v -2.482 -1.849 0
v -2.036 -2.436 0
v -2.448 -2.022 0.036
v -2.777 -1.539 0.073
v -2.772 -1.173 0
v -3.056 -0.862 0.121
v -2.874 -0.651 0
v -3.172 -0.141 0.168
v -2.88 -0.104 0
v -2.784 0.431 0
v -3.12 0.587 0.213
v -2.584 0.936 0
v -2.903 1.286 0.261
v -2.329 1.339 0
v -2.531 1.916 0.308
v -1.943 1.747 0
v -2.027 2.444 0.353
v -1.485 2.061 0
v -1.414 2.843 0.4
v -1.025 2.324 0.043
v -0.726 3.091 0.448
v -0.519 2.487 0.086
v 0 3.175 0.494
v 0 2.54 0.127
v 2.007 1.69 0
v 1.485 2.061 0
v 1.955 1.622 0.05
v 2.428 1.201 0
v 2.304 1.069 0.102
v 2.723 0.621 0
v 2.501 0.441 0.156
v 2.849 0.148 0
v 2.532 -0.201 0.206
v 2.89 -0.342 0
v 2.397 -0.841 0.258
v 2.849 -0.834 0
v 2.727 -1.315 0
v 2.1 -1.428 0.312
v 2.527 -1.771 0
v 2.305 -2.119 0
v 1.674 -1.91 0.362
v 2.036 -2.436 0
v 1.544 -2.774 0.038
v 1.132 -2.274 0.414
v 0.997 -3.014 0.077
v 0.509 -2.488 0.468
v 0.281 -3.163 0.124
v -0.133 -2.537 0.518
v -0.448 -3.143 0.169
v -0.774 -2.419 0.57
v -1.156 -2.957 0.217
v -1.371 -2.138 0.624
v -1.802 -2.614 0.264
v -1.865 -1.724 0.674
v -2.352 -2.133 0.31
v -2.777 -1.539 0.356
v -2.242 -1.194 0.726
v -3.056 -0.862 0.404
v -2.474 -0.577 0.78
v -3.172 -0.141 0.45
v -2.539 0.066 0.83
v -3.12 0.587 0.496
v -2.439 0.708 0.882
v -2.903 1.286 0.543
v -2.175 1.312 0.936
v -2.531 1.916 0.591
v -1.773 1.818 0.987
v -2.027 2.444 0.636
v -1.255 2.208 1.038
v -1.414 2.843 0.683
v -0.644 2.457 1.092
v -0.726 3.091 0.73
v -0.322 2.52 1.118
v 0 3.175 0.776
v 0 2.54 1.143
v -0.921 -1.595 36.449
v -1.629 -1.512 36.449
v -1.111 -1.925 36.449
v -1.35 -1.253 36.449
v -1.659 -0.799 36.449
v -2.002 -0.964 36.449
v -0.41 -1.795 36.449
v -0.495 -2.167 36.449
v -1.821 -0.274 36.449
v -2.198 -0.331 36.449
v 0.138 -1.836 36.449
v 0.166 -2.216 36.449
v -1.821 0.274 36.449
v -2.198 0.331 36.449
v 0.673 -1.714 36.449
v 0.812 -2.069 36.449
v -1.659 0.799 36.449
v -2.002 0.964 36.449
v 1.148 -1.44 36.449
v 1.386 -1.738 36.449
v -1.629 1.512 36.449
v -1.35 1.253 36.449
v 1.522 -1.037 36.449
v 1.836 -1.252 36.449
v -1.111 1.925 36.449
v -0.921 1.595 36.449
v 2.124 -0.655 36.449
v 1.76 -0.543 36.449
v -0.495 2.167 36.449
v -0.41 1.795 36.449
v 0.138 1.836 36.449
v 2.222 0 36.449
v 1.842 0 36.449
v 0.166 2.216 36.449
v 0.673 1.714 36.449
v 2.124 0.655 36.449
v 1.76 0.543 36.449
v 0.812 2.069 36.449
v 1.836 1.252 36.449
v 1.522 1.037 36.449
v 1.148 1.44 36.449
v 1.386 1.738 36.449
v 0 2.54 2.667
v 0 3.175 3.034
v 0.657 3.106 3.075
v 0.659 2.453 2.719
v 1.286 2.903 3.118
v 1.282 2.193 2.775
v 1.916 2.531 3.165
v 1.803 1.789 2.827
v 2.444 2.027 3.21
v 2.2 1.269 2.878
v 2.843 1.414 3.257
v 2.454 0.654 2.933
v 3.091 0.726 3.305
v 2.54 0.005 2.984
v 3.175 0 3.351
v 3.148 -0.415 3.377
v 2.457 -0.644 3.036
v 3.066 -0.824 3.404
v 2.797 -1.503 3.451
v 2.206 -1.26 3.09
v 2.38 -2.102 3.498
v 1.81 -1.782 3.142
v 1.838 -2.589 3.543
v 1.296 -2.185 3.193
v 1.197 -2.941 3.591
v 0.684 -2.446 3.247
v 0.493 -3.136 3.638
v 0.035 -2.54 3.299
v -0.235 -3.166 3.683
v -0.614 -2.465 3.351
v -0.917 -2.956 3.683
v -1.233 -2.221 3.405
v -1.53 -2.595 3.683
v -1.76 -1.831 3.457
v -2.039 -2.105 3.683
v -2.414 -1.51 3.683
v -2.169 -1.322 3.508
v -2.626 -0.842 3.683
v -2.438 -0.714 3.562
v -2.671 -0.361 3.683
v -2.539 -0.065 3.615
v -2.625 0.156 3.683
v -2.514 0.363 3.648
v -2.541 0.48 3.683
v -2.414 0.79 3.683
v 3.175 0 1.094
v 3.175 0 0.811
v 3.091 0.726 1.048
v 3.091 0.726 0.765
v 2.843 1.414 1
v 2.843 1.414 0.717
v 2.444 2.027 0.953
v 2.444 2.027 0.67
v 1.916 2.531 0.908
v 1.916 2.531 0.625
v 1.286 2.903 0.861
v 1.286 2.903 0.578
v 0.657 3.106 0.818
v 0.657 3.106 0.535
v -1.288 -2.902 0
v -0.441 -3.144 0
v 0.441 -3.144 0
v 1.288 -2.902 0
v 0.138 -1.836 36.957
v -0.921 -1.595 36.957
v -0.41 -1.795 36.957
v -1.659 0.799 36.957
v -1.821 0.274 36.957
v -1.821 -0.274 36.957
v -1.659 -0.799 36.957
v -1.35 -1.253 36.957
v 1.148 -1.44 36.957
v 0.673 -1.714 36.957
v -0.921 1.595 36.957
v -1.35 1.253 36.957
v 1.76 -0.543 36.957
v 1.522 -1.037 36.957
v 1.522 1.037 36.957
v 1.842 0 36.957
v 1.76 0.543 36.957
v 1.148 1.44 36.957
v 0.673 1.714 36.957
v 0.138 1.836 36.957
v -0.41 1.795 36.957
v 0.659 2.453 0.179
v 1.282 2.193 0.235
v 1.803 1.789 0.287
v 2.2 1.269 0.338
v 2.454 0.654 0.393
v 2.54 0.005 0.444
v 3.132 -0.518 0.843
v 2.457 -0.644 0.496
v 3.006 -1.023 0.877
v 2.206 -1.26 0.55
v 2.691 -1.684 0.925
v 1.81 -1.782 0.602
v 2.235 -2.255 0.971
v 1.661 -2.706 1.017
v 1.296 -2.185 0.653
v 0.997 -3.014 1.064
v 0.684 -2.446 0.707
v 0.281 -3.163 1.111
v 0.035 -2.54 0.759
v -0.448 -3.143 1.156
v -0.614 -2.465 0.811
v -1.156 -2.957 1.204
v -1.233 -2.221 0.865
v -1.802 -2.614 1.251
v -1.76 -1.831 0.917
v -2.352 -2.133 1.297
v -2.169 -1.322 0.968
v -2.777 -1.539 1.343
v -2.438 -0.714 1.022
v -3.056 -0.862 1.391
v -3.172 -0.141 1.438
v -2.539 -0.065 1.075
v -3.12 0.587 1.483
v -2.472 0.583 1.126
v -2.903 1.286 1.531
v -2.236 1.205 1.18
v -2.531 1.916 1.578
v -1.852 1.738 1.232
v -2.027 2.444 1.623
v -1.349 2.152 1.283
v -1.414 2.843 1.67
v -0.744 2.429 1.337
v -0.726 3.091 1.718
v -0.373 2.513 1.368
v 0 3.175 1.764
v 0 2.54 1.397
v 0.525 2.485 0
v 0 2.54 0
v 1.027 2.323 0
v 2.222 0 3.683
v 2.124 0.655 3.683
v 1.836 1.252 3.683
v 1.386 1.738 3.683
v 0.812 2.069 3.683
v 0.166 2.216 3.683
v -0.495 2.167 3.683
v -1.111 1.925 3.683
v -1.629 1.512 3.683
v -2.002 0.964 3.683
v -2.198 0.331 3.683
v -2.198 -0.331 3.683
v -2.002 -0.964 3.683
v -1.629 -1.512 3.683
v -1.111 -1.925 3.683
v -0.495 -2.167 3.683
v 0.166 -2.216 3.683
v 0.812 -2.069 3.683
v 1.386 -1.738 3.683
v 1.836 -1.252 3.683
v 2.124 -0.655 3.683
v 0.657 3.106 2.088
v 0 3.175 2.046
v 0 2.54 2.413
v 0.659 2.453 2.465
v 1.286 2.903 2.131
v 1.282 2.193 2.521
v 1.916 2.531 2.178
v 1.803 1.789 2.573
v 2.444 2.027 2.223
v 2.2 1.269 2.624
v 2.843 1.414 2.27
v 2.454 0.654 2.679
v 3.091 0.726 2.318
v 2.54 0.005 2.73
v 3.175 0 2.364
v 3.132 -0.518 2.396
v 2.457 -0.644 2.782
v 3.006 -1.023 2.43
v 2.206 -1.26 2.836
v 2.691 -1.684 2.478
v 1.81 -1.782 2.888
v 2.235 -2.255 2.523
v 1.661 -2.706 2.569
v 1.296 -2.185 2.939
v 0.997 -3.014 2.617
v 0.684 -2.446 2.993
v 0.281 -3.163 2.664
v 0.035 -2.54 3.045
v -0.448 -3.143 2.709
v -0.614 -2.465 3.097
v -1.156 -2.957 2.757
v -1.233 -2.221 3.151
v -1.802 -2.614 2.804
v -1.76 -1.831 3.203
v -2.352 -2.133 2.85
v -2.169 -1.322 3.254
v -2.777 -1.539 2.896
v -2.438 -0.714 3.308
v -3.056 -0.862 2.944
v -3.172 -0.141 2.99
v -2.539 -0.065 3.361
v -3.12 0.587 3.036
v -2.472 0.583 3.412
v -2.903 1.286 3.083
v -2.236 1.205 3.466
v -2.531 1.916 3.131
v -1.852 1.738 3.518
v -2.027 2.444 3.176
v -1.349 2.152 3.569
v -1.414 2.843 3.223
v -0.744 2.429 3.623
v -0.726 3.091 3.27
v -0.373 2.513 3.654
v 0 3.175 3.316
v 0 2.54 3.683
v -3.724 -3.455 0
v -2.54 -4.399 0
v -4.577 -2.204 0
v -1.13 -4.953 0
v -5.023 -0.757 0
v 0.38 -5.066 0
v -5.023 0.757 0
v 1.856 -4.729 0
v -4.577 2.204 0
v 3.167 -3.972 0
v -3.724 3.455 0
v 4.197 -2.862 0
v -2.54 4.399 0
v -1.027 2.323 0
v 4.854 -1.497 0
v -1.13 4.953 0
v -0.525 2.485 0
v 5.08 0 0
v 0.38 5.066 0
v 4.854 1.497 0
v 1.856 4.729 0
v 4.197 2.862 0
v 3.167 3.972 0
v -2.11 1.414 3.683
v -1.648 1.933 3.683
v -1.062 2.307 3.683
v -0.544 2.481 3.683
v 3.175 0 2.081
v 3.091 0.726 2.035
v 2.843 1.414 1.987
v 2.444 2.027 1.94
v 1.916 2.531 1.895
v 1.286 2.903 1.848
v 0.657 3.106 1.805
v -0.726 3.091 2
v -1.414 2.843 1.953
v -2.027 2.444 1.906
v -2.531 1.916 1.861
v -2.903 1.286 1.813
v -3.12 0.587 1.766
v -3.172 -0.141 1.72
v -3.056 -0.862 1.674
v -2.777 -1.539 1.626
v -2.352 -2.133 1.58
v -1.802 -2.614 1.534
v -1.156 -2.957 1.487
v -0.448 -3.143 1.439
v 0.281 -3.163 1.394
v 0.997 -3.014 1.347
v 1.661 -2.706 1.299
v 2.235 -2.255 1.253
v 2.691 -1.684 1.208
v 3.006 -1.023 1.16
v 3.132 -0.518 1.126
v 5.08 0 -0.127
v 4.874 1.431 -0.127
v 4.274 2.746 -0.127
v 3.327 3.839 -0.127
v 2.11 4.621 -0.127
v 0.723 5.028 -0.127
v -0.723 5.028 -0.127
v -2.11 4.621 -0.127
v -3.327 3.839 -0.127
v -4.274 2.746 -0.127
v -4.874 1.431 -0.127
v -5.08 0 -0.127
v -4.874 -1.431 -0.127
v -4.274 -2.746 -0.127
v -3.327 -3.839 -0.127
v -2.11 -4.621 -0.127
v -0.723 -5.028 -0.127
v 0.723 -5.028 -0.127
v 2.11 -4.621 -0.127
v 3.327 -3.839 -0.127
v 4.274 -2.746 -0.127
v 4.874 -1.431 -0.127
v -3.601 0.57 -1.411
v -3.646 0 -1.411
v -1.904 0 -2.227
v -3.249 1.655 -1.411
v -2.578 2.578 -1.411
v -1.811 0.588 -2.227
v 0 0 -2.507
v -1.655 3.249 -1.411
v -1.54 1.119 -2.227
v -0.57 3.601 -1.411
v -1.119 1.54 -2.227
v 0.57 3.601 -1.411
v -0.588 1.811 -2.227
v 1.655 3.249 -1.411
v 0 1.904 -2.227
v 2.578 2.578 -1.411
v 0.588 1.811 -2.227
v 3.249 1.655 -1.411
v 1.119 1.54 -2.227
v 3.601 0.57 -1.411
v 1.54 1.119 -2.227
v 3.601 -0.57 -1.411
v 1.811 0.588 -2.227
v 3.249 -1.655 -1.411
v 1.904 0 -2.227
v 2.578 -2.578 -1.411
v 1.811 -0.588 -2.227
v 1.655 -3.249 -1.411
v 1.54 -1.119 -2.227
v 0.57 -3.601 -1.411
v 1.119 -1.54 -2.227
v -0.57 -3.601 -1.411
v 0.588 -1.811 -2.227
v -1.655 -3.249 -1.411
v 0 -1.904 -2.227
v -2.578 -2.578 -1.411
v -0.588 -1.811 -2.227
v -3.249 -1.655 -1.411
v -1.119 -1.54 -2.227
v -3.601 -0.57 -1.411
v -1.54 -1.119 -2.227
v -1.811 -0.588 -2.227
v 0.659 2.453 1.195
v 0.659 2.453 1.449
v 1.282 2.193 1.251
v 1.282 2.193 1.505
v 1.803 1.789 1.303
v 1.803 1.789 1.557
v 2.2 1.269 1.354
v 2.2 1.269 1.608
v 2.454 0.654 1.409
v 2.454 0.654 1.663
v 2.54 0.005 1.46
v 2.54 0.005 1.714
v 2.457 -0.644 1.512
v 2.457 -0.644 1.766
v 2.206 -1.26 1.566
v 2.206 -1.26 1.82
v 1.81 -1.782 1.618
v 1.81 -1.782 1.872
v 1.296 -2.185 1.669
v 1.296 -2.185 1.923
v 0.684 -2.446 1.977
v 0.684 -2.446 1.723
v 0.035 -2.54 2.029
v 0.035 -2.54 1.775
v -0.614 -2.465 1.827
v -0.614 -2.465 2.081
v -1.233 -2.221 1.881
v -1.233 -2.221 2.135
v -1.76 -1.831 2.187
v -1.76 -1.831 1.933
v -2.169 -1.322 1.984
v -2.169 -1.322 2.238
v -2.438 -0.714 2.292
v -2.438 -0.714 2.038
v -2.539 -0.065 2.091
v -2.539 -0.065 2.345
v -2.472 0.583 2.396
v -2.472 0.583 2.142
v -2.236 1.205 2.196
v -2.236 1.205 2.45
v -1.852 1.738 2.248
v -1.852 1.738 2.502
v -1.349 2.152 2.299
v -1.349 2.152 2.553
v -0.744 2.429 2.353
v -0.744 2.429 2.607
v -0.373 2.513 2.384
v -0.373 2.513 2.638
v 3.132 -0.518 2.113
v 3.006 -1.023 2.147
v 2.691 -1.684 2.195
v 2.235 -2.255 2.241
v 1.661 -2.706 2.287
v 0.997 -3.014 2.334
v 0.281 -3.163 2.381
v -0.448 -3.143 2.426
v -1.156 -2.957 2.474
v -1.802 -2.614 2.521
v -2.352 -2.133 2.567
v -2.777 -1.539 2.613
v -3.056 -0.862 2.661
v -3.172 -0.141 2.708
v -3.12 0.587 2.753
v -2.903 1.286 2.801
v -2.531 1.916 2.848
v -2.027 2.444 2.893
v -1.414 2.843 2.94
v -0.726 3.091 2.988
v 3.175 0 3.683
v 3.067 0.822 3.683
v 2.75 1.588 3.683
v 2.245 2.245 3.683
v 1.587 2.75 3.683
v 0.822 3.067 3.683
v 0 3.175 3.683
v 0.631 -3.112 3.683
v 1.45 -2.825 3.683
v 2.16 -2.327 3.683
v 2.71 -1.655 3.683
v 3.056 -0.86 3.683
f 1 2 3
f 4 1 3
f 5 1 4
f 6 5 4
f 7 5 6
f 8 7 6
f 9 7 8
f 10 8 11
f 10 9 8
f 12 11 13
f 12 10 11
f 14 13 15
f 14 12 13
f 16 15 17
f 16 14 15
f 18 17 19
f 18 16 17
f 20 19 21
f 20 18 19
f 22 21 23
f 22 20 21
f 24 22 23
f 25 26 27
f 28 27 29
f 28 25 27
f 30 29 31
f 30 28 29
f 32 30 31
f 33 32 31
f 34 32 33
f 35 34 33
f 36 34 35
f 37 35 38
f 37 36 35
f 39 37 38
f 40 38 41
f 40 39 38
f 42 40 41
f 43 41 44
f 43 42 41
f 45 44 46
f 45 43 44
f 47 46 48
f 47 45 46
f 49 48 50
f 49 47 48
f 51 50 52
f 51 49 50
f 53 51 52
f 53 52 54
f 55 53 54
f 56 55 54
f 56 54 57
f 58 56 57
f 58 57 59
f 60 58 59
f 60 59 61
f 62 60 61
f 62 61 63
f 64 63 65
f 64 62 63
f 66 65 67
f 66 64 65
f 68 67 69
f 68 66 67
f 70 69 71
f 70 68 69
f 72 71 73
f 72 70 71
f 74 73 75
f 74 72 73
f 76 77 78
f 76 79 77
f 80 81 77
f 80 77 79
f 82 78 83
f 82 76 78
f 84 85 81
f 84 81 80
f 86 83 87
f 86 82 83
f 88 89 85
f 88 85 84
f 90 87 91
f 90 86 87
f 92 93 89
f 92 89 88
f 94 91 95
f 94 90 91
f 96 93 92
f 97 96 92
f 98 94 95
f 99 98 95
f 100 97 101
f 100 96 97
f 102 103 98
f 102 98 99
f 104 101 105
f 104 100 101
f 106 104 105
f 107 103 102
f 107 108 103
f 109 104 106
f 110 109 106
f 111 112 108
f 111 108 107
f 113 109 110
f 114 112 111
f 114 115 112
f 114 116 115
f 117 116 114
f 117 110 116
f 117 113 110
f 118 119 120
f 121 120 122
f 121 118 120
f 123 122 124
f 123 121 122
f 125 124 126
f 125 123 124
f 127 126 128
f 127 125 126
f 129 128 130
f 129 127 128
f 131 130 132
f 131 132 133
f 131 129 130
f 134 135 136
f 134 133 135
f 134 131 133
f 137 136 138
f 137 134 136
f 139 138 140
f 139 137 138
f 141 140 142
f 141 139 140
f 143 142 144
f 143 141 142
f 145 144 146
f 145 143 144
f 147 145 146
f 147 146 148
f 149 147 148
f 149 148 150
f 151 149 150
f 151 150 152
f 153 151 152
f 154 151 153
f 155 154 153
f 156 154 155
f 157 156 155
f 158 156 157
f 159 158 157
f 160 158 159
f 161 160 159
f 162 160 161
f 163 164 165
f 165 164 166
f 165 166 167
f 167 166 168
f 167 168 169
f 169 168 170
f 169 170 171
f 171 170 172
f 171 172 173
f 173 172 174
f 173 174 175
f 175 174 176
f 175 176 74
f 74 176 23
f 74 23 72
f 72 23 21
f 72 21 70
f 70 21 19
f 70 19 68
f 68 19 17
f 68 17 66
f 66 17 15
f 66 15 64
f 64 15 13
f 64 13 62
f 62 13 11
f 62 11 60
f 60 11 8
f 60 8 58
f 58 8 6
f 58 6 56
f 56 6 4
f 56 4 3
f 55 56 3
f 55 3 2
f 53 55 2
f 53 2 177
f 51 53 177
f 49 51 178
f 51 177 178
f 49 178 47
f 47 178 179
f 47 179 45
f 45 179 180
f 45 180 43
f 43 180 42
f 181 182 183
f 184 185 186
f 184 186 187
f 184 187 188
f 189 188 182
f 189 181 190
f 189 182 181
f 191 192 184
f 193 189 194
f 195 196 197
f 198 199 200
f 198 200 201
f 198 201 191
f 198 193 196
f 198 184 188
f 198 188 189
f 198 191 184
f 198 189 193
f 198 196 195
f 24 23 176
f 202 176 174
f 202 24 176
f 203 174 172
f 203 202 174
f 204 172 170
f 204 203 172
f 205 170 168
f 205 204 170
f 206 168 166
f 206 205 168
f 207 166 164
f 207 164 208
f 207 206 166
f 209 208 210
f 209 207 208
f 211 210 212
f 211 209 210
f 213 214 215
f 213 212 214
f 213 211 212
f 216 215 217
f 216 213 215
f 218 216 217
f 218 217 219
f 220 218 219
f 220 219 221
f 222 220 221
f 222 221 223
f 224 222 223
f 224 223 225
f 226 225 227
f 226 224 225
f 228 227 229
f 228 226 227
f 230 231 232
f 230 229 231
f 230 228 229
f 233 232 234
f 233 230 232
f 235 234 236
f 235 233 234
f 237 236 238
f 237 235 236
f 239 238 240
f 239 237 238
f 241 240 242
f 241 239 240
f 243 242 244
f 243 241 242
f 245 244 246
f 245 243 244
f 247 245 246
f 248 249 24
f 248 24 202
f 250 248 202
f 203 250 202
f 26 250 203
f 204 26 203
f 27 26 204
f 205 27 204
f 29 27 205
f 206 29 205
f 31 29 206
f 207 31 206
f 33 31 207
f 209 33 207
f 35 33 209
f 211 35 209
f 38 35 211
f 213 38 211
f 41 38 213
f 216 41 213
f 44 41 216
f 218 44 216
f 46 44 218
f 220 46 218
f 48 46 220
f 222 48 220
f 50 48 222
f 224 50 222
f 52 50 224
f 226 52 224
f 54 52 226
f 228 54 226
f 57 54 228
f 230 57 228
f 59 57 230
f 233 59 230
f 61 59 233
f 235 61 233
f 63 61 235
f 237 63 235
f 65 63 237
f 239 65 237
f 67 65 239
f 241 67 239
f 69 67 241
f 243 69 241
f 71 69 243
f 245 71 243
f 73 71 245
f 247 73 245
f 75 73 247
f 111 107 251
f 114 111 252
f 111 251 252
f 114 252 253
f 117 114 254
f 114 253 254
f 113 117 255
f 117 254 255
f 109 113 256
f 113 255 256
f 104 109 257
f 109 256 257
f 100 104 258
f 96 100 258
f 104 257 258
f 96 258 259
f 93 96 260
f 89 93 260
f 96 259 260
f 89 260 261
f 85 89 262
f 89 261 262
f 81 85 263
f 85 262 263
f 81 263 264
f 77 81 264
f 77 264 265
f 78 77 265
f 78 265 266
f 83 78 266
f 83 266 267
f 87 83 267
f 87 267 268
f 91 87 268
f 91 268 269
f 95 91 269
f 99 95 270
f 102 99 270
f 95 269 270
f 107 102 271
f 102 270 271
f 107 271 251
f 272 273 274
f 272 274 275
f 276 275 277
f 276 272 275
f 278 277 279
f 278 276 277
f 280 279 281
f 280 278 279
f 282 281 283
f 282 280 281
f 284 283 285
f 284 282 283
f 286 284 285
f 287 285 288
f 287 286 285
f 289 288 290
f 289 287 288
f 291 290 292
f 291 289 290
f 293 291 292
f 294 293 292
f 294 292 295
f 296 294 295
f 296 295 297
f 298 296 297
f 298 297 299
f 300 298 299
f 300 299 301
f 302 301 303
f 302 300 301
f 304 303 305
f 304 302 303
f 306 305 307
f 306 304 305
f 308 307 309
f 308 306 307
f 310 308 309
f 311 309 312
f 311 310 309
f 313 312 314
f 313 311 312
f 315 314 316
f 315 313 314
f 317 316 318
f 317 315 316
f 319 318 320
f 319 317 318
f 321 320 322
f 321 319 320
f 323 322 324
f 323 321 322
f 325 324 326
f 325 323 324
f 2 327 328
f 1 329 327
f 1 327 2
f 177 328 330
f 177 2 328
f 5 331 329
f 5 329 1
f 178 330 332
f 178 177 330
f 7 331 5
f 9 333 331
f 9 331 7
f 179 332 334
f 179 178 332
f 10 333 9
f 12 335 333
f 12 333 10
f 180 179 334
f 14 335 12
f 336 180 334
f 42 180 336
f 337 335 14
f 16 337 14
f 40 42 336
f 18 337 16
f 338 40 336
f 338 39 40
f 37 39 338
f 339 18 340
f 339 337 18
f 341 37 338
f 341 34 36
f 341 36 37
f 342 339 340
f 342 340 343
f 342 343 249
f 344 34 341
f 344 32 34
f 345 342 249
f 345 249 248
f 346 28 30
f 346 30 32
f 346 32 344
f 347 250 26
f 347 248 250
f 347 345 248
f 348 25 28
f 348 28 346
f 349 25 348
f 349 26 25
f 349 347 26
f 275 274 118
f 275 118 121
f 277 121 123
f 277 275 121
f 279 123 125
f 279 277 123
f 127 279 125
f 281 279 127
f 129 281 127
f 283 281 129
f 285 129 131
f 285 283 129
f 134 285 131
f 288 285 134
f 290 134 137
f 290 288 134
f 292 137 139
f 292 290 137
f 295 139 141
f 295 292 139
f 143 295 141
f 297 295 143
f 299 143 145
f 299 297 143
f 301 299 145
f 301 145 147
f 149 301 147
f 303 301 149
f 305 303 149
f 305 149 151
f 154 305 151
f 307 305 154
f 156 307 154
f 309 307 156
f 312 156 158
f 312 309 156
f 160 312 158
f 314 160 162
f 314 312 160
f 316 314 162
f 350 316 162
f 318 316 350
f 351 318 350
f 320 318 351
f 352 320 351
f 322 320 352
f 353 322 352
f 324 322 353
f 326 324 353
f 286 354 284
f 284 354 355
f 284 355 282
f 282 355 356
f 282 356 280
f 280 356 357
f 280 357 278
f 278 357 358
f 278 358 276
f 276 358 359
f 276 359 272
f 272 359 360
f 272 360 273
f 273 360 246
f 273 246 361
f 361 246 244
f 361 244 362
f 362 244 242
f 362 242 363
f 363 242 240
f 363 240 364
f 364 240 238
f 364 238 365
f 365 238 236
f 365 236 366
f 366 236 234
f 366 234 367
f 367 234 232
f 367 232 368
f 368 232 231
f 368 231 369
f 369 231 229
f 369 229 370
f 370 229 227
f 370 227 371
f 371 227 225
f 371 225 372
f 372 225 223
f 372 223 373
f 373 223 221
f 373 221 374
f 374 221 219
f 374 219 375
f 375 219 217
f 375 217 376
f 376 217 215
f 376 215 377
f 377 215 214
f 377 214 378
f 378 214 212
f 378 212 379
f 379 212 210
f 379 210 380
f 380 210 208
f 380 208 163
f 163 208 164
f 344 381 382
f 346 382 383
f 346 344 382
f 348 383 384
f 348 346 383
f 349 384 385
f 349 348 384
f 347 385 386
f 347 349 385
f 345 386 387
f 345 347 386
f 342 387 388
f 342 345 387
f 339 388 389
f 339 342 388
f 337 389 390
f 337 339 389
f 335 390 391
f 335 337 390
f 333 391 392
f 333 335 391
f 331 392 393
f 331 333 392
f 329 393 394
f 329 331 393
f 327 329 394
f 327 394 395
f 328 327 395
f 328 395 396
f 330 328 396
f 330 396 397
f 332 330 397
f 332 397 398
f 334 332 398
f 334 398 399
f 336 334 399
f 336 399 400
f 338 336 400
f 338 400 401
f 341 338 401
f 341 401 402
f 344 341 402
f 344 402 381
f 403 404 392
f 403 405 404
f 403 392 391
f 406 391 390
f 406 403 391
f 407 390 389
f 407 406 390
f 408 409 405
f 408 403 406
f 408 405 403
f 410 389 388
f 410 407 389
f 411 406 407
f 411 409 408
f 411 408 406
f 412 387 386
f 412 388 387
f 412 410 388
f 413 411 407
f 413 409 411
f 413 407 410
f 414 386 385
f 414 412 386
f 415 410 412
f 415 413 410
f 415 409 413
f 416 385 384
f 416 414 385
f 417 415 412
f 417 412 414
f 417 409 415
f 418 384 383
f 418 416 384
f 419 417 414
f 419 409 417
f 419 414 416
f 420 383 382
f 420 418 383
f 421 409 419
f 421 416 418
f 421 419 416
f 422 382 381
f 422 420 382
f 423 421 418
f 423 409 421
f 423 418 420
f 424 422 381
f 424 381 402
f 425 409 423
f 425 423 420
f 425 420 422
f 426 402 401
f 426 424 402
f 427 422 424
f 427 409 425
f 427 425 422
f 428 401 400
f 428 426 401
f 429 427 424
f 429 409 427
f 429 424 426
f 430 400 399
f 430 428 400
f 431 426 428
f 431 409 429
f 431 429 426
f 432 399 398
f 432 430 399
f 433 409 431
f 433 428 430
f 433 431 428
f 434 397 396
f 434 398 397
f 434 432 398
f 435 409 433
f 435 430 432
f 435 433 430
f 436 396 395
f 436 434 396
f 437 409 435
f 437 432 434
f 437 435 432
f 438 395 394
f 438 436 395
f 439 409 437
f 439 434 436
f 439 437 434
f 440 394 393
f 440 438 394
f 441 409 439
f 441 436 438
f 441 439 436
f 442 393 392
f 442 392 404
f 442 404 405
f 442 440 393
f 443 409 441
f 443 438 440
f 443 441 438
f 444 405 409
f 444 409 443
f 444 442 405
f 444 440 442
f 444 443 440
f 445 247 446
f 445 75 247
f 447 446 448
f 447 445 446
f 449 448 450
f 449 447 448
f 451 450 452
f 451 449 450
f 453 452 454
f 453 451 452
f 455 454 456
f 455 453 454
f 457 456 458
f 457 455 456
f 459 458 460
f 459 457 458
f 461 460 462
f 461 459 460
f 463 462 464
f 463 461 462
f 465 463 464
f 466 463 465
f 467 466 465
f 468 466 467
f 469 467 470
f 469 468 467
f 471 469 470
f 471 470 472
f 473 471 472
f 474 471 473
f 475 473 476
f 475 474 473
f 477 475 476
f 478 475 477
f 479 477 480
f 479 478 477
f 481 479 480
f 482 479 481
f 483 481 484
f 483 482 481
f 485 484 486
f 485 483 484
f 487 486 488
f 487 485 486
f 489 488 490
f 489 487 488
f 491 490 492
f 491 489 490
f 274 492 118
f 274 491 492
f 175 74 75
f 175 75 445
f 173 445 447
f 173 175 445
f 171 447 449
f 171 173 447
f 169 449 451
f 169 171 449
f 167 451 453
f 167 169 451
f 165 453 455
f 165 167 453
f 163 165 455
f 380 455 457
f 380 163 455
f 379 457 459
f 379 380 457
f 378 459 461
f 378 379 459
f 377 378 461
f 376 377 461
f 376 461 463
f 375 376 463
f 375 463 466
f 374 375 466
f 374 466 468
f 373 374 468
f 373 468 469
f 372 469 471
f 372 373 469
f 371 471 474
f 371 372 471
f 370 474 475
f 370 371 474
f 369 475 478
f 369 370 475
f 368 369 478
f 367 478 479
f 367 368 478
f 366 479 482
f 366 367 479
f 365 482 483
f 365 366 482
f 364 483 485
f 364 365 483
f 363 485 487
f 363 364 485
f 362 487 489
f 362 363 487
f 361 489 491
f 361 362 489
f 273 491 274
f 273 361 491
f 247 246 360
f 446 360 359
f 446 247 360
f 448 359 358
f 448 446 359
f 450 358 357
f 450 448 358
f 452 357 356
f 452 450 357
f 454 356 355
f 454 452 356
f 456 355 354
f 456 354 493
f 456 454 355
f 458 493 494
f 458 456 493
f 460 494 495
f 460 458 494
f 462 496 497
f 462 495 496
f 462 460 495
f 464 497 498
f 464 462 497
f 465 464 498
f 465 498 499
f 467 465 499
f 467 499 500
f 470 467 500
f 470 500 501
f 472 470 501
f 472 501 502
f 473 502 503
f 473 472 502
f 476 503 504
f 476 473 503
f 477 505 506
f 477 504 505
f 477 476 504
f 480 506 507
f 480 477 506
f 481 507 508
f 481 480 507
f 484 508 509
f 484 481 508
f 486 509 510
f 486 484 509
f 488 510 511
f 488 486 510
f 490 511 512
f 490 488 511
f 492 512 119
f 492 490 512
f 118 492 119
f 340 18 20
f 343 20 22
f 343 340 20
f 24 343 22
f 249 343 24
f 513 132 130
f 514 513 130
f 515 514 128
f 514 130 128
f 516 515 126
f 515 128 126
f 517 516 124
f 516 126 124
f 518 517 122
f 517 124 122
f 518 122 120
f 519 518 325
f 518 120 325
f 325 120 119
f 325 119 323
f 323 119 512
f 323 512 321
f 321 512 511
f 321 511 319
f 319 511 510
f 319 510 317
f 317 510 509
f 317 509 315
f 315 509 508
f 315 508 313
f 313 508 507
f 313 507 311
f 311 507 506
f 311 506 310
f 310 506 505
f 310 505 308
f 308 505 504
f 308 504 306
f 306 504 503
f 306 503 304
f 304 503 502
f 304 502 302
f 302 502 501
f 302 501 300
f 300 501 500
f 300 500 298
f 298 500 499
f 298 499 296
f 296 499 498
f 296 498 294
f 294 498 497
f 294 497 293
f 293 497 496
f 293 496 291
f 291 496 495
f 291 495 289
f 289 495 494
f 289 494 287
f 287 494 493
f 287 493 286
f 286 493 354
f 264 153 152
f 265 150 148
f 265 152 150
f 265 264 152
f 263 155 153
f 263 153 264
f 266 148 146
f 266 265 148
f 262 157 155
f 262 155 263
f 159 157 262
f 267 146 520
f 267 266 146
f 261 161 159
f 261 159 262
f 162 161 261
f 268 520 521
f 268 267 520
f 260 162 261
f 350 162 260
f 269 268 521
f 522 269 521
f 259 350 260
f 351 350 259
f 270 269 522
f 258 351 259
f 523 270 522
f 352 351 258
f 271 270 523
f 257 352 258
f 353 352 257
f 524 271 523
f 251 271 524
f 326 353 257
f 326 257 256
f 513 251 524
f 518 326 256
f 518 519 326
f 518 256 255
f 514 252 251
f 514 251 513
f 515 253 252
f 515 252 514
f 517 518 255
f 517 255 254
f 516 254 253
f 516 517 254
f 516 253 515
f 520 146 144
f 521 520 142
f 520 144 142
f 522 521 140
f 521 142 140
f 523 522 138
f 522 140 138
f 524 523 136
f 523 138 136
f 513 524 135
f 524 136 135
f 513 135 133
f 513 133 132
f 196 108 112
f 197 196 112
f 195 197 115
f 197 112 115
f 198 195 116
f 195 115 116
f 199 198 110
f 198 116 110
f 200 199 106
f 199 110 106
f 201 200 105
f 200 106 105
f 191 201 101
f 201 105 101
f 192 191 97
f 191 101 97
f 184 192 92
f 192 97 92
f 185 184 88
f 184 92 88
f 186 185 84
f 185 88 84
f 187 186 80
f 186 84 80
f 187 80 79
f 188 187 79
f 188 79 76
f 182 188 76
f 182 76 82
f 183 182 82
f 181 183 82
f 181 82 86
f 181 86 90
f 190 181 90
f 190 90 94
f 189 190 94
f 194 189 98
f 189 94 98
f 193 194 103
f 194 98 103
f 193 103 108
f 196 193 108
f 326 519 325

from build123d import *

# Parameters (mm, degrees)
SKETCH3_R           = 3.175
BOSS_EXTRUDE1_DEPTH = 3.683
CUT_SWEEP1_PITCH    = 1.27
SKETCH10_R          = 2.2225
BOSS_EXTRUDE5_DEPTH = 32.766
SKETCH9_R           = 5.08
BOSS_EXTRUDE4_DEPTH = 0.127
DOME3_FACE_RADIUS   = 5.08
DOME3_HEIGHT        = 2.38
SKETCH11_R          = 1.8415
BOSS_EXTRUDE6_DEPTH = 0.508


with BuildPart() as part:
    # Sketch3 → Boss-Extrude1 (new body)
    with BuildSketch(Plane.XY):
        Circle(SKETCH3_R)
    extrude(amount=BOSS_EXTRUDE1_DEPTH)

    # Cut-Sweep1: arcs per turn and ends read off the stored shape
    # Cut-Sweep1: the profile of Sketch5 profile screwed along a left-hand helix through 4 turns, 8 arcs to a turn; built about Z, then put on its axis
    cut_sweep1_z = Axis((0, 0, 0), (0, 0, 1))
    cut_sweep1_corners = [(2.54, 0, -1.397), (3.1753, 0, -1.763790626), (3.1753, 0, -0.776209374), (2.54, 0, -1.143)]
    with BuildLine(mode=Mode.PRIVATE) as cut_sweep1_profile:
        Line(cut_sweep1_corners[0], cut_sweep1_corners[1])
        Line(cut_sweep1_corners[1], cut_sweep1_corners[2])
        Line(cut_sweep1_corners[2], cut_sweep1_corners[3])
        Line(cut_sweep1_corners[3], cut_sweep1_corners[0])
    cut_sweep1_cap = Face(cut_sweep1_profile.wire())
    cut_sweep1_turn_angles = [0, -22.5, -45, -67.5, -90, -112.5, -135, -157.5, -180, -202.5, -225, -247.5, -270, -292.5, -315, -337.5, -360]
    cut_sweep1_turn_weights = [1, 0.9238795325112867, 1, 0.9238795325112867, 1, 0.9238795325112867, 1, 0.9238795325112867, 1, 0.9238795325112867, 1, 0.9238795325112867, 1, 0.9238795325112867, 1, 0.9238795325112867, 1]
    cut_sweep1_turn_rails = [Edge.make_bspline([Vector(p[0], p[1], 0).rotate(cut_sweep1_z, cut_sweep1_turn_angles[k]) / cut_sweep1_turn_weights[k] + Vector(0, 0, p[2] + -CUT_SWEEP1_PITCH * cut_sweep1_turn_angles[k] / 360) for k in range(17)], [0, 0, 0, 1, 1, 2, 2, 3, 3, 4, 4, 5, 5, 6, 6, 7, 7, 8, 8, 8], 2, cut_sweep1_turn_weights) for p in cut_sweep1_corners]
    cut_sweep1_turn_sides = [Face.make_surface_from_curves(cut_sweep1_turn_rails[p[0]], cut_sweep1_turn_rails[p[1]]) for p in [(0, 1), (1, 2), (2, 3), (3, 0)]]
    cut_sweep1 = Plane(origin=(0, 0, 0), x_dir=(0, 1, 0), z_dir=(0, 0, 1)) * Solid(Shell([*[p.moved(Location((0, 0, CUT_SWEEP1_PITCH * i))) for i in range(4) for p in cut_sweep1_turn_sides], cut_sweep1_cap, cut_sweep1_cap.rotate(cut_sweep1_z, -1440).moved(Location((0, 0, -CUT_SWEEP1_PITCH * -1440 / 360)))]))
    add(cut_sweep1, mode=Mode.SUBTRACT)

    # Sketch10 → Boss-Extrude5 (add)
    with BuildSketch(Plane.XY.offset(3.683)):
        Circle(SKETCH10_R)
    extrude(amount=BOSS_EXTRUDE5_DEPTH)

    # Sketch9 → Boss-Extrude4 (add)
    with BuildSketch(Plane.XY):
        Circle(SKETCH9_R)
    extrude(amount=-BOSS_EXTRUDE4_DEPTH)

    # Dome3: a dome of height H over a round flat face of radius A is a cap of a sphere of radius (A * A + H * H) / (2 * H)
    dome3_r = (DOME3_FACE_RADIUS * DOME3_FACE_RADIUS + DOME3_HEIGHT * DOME3_HEIGHT) / (2 * DOME3_HEIGHT)
    dome3_base = Plane((0, 0, -0.127), z_dir=(0, 0, -1))
    with Locations(dome3_base.offset(DOME3_HEIGHT - dome3_r)):
        dome3_ball = Sphere(dome3_r, mode=Mode.PRIVATE)
    add(split(dome3_ball, bisect_by=dome3_base, keep=Keep.TOP, mode=Mode.PRIVATE))

    # Sketch11 → Boss-Extrude6 (add)
    with BuildSketch(Plane.XY.offset(36.449)):
        Circle(SKETCH11_R)
    extrude(amount=BOSS_EXTRUDE6_DEPTH)


solid = part.part
